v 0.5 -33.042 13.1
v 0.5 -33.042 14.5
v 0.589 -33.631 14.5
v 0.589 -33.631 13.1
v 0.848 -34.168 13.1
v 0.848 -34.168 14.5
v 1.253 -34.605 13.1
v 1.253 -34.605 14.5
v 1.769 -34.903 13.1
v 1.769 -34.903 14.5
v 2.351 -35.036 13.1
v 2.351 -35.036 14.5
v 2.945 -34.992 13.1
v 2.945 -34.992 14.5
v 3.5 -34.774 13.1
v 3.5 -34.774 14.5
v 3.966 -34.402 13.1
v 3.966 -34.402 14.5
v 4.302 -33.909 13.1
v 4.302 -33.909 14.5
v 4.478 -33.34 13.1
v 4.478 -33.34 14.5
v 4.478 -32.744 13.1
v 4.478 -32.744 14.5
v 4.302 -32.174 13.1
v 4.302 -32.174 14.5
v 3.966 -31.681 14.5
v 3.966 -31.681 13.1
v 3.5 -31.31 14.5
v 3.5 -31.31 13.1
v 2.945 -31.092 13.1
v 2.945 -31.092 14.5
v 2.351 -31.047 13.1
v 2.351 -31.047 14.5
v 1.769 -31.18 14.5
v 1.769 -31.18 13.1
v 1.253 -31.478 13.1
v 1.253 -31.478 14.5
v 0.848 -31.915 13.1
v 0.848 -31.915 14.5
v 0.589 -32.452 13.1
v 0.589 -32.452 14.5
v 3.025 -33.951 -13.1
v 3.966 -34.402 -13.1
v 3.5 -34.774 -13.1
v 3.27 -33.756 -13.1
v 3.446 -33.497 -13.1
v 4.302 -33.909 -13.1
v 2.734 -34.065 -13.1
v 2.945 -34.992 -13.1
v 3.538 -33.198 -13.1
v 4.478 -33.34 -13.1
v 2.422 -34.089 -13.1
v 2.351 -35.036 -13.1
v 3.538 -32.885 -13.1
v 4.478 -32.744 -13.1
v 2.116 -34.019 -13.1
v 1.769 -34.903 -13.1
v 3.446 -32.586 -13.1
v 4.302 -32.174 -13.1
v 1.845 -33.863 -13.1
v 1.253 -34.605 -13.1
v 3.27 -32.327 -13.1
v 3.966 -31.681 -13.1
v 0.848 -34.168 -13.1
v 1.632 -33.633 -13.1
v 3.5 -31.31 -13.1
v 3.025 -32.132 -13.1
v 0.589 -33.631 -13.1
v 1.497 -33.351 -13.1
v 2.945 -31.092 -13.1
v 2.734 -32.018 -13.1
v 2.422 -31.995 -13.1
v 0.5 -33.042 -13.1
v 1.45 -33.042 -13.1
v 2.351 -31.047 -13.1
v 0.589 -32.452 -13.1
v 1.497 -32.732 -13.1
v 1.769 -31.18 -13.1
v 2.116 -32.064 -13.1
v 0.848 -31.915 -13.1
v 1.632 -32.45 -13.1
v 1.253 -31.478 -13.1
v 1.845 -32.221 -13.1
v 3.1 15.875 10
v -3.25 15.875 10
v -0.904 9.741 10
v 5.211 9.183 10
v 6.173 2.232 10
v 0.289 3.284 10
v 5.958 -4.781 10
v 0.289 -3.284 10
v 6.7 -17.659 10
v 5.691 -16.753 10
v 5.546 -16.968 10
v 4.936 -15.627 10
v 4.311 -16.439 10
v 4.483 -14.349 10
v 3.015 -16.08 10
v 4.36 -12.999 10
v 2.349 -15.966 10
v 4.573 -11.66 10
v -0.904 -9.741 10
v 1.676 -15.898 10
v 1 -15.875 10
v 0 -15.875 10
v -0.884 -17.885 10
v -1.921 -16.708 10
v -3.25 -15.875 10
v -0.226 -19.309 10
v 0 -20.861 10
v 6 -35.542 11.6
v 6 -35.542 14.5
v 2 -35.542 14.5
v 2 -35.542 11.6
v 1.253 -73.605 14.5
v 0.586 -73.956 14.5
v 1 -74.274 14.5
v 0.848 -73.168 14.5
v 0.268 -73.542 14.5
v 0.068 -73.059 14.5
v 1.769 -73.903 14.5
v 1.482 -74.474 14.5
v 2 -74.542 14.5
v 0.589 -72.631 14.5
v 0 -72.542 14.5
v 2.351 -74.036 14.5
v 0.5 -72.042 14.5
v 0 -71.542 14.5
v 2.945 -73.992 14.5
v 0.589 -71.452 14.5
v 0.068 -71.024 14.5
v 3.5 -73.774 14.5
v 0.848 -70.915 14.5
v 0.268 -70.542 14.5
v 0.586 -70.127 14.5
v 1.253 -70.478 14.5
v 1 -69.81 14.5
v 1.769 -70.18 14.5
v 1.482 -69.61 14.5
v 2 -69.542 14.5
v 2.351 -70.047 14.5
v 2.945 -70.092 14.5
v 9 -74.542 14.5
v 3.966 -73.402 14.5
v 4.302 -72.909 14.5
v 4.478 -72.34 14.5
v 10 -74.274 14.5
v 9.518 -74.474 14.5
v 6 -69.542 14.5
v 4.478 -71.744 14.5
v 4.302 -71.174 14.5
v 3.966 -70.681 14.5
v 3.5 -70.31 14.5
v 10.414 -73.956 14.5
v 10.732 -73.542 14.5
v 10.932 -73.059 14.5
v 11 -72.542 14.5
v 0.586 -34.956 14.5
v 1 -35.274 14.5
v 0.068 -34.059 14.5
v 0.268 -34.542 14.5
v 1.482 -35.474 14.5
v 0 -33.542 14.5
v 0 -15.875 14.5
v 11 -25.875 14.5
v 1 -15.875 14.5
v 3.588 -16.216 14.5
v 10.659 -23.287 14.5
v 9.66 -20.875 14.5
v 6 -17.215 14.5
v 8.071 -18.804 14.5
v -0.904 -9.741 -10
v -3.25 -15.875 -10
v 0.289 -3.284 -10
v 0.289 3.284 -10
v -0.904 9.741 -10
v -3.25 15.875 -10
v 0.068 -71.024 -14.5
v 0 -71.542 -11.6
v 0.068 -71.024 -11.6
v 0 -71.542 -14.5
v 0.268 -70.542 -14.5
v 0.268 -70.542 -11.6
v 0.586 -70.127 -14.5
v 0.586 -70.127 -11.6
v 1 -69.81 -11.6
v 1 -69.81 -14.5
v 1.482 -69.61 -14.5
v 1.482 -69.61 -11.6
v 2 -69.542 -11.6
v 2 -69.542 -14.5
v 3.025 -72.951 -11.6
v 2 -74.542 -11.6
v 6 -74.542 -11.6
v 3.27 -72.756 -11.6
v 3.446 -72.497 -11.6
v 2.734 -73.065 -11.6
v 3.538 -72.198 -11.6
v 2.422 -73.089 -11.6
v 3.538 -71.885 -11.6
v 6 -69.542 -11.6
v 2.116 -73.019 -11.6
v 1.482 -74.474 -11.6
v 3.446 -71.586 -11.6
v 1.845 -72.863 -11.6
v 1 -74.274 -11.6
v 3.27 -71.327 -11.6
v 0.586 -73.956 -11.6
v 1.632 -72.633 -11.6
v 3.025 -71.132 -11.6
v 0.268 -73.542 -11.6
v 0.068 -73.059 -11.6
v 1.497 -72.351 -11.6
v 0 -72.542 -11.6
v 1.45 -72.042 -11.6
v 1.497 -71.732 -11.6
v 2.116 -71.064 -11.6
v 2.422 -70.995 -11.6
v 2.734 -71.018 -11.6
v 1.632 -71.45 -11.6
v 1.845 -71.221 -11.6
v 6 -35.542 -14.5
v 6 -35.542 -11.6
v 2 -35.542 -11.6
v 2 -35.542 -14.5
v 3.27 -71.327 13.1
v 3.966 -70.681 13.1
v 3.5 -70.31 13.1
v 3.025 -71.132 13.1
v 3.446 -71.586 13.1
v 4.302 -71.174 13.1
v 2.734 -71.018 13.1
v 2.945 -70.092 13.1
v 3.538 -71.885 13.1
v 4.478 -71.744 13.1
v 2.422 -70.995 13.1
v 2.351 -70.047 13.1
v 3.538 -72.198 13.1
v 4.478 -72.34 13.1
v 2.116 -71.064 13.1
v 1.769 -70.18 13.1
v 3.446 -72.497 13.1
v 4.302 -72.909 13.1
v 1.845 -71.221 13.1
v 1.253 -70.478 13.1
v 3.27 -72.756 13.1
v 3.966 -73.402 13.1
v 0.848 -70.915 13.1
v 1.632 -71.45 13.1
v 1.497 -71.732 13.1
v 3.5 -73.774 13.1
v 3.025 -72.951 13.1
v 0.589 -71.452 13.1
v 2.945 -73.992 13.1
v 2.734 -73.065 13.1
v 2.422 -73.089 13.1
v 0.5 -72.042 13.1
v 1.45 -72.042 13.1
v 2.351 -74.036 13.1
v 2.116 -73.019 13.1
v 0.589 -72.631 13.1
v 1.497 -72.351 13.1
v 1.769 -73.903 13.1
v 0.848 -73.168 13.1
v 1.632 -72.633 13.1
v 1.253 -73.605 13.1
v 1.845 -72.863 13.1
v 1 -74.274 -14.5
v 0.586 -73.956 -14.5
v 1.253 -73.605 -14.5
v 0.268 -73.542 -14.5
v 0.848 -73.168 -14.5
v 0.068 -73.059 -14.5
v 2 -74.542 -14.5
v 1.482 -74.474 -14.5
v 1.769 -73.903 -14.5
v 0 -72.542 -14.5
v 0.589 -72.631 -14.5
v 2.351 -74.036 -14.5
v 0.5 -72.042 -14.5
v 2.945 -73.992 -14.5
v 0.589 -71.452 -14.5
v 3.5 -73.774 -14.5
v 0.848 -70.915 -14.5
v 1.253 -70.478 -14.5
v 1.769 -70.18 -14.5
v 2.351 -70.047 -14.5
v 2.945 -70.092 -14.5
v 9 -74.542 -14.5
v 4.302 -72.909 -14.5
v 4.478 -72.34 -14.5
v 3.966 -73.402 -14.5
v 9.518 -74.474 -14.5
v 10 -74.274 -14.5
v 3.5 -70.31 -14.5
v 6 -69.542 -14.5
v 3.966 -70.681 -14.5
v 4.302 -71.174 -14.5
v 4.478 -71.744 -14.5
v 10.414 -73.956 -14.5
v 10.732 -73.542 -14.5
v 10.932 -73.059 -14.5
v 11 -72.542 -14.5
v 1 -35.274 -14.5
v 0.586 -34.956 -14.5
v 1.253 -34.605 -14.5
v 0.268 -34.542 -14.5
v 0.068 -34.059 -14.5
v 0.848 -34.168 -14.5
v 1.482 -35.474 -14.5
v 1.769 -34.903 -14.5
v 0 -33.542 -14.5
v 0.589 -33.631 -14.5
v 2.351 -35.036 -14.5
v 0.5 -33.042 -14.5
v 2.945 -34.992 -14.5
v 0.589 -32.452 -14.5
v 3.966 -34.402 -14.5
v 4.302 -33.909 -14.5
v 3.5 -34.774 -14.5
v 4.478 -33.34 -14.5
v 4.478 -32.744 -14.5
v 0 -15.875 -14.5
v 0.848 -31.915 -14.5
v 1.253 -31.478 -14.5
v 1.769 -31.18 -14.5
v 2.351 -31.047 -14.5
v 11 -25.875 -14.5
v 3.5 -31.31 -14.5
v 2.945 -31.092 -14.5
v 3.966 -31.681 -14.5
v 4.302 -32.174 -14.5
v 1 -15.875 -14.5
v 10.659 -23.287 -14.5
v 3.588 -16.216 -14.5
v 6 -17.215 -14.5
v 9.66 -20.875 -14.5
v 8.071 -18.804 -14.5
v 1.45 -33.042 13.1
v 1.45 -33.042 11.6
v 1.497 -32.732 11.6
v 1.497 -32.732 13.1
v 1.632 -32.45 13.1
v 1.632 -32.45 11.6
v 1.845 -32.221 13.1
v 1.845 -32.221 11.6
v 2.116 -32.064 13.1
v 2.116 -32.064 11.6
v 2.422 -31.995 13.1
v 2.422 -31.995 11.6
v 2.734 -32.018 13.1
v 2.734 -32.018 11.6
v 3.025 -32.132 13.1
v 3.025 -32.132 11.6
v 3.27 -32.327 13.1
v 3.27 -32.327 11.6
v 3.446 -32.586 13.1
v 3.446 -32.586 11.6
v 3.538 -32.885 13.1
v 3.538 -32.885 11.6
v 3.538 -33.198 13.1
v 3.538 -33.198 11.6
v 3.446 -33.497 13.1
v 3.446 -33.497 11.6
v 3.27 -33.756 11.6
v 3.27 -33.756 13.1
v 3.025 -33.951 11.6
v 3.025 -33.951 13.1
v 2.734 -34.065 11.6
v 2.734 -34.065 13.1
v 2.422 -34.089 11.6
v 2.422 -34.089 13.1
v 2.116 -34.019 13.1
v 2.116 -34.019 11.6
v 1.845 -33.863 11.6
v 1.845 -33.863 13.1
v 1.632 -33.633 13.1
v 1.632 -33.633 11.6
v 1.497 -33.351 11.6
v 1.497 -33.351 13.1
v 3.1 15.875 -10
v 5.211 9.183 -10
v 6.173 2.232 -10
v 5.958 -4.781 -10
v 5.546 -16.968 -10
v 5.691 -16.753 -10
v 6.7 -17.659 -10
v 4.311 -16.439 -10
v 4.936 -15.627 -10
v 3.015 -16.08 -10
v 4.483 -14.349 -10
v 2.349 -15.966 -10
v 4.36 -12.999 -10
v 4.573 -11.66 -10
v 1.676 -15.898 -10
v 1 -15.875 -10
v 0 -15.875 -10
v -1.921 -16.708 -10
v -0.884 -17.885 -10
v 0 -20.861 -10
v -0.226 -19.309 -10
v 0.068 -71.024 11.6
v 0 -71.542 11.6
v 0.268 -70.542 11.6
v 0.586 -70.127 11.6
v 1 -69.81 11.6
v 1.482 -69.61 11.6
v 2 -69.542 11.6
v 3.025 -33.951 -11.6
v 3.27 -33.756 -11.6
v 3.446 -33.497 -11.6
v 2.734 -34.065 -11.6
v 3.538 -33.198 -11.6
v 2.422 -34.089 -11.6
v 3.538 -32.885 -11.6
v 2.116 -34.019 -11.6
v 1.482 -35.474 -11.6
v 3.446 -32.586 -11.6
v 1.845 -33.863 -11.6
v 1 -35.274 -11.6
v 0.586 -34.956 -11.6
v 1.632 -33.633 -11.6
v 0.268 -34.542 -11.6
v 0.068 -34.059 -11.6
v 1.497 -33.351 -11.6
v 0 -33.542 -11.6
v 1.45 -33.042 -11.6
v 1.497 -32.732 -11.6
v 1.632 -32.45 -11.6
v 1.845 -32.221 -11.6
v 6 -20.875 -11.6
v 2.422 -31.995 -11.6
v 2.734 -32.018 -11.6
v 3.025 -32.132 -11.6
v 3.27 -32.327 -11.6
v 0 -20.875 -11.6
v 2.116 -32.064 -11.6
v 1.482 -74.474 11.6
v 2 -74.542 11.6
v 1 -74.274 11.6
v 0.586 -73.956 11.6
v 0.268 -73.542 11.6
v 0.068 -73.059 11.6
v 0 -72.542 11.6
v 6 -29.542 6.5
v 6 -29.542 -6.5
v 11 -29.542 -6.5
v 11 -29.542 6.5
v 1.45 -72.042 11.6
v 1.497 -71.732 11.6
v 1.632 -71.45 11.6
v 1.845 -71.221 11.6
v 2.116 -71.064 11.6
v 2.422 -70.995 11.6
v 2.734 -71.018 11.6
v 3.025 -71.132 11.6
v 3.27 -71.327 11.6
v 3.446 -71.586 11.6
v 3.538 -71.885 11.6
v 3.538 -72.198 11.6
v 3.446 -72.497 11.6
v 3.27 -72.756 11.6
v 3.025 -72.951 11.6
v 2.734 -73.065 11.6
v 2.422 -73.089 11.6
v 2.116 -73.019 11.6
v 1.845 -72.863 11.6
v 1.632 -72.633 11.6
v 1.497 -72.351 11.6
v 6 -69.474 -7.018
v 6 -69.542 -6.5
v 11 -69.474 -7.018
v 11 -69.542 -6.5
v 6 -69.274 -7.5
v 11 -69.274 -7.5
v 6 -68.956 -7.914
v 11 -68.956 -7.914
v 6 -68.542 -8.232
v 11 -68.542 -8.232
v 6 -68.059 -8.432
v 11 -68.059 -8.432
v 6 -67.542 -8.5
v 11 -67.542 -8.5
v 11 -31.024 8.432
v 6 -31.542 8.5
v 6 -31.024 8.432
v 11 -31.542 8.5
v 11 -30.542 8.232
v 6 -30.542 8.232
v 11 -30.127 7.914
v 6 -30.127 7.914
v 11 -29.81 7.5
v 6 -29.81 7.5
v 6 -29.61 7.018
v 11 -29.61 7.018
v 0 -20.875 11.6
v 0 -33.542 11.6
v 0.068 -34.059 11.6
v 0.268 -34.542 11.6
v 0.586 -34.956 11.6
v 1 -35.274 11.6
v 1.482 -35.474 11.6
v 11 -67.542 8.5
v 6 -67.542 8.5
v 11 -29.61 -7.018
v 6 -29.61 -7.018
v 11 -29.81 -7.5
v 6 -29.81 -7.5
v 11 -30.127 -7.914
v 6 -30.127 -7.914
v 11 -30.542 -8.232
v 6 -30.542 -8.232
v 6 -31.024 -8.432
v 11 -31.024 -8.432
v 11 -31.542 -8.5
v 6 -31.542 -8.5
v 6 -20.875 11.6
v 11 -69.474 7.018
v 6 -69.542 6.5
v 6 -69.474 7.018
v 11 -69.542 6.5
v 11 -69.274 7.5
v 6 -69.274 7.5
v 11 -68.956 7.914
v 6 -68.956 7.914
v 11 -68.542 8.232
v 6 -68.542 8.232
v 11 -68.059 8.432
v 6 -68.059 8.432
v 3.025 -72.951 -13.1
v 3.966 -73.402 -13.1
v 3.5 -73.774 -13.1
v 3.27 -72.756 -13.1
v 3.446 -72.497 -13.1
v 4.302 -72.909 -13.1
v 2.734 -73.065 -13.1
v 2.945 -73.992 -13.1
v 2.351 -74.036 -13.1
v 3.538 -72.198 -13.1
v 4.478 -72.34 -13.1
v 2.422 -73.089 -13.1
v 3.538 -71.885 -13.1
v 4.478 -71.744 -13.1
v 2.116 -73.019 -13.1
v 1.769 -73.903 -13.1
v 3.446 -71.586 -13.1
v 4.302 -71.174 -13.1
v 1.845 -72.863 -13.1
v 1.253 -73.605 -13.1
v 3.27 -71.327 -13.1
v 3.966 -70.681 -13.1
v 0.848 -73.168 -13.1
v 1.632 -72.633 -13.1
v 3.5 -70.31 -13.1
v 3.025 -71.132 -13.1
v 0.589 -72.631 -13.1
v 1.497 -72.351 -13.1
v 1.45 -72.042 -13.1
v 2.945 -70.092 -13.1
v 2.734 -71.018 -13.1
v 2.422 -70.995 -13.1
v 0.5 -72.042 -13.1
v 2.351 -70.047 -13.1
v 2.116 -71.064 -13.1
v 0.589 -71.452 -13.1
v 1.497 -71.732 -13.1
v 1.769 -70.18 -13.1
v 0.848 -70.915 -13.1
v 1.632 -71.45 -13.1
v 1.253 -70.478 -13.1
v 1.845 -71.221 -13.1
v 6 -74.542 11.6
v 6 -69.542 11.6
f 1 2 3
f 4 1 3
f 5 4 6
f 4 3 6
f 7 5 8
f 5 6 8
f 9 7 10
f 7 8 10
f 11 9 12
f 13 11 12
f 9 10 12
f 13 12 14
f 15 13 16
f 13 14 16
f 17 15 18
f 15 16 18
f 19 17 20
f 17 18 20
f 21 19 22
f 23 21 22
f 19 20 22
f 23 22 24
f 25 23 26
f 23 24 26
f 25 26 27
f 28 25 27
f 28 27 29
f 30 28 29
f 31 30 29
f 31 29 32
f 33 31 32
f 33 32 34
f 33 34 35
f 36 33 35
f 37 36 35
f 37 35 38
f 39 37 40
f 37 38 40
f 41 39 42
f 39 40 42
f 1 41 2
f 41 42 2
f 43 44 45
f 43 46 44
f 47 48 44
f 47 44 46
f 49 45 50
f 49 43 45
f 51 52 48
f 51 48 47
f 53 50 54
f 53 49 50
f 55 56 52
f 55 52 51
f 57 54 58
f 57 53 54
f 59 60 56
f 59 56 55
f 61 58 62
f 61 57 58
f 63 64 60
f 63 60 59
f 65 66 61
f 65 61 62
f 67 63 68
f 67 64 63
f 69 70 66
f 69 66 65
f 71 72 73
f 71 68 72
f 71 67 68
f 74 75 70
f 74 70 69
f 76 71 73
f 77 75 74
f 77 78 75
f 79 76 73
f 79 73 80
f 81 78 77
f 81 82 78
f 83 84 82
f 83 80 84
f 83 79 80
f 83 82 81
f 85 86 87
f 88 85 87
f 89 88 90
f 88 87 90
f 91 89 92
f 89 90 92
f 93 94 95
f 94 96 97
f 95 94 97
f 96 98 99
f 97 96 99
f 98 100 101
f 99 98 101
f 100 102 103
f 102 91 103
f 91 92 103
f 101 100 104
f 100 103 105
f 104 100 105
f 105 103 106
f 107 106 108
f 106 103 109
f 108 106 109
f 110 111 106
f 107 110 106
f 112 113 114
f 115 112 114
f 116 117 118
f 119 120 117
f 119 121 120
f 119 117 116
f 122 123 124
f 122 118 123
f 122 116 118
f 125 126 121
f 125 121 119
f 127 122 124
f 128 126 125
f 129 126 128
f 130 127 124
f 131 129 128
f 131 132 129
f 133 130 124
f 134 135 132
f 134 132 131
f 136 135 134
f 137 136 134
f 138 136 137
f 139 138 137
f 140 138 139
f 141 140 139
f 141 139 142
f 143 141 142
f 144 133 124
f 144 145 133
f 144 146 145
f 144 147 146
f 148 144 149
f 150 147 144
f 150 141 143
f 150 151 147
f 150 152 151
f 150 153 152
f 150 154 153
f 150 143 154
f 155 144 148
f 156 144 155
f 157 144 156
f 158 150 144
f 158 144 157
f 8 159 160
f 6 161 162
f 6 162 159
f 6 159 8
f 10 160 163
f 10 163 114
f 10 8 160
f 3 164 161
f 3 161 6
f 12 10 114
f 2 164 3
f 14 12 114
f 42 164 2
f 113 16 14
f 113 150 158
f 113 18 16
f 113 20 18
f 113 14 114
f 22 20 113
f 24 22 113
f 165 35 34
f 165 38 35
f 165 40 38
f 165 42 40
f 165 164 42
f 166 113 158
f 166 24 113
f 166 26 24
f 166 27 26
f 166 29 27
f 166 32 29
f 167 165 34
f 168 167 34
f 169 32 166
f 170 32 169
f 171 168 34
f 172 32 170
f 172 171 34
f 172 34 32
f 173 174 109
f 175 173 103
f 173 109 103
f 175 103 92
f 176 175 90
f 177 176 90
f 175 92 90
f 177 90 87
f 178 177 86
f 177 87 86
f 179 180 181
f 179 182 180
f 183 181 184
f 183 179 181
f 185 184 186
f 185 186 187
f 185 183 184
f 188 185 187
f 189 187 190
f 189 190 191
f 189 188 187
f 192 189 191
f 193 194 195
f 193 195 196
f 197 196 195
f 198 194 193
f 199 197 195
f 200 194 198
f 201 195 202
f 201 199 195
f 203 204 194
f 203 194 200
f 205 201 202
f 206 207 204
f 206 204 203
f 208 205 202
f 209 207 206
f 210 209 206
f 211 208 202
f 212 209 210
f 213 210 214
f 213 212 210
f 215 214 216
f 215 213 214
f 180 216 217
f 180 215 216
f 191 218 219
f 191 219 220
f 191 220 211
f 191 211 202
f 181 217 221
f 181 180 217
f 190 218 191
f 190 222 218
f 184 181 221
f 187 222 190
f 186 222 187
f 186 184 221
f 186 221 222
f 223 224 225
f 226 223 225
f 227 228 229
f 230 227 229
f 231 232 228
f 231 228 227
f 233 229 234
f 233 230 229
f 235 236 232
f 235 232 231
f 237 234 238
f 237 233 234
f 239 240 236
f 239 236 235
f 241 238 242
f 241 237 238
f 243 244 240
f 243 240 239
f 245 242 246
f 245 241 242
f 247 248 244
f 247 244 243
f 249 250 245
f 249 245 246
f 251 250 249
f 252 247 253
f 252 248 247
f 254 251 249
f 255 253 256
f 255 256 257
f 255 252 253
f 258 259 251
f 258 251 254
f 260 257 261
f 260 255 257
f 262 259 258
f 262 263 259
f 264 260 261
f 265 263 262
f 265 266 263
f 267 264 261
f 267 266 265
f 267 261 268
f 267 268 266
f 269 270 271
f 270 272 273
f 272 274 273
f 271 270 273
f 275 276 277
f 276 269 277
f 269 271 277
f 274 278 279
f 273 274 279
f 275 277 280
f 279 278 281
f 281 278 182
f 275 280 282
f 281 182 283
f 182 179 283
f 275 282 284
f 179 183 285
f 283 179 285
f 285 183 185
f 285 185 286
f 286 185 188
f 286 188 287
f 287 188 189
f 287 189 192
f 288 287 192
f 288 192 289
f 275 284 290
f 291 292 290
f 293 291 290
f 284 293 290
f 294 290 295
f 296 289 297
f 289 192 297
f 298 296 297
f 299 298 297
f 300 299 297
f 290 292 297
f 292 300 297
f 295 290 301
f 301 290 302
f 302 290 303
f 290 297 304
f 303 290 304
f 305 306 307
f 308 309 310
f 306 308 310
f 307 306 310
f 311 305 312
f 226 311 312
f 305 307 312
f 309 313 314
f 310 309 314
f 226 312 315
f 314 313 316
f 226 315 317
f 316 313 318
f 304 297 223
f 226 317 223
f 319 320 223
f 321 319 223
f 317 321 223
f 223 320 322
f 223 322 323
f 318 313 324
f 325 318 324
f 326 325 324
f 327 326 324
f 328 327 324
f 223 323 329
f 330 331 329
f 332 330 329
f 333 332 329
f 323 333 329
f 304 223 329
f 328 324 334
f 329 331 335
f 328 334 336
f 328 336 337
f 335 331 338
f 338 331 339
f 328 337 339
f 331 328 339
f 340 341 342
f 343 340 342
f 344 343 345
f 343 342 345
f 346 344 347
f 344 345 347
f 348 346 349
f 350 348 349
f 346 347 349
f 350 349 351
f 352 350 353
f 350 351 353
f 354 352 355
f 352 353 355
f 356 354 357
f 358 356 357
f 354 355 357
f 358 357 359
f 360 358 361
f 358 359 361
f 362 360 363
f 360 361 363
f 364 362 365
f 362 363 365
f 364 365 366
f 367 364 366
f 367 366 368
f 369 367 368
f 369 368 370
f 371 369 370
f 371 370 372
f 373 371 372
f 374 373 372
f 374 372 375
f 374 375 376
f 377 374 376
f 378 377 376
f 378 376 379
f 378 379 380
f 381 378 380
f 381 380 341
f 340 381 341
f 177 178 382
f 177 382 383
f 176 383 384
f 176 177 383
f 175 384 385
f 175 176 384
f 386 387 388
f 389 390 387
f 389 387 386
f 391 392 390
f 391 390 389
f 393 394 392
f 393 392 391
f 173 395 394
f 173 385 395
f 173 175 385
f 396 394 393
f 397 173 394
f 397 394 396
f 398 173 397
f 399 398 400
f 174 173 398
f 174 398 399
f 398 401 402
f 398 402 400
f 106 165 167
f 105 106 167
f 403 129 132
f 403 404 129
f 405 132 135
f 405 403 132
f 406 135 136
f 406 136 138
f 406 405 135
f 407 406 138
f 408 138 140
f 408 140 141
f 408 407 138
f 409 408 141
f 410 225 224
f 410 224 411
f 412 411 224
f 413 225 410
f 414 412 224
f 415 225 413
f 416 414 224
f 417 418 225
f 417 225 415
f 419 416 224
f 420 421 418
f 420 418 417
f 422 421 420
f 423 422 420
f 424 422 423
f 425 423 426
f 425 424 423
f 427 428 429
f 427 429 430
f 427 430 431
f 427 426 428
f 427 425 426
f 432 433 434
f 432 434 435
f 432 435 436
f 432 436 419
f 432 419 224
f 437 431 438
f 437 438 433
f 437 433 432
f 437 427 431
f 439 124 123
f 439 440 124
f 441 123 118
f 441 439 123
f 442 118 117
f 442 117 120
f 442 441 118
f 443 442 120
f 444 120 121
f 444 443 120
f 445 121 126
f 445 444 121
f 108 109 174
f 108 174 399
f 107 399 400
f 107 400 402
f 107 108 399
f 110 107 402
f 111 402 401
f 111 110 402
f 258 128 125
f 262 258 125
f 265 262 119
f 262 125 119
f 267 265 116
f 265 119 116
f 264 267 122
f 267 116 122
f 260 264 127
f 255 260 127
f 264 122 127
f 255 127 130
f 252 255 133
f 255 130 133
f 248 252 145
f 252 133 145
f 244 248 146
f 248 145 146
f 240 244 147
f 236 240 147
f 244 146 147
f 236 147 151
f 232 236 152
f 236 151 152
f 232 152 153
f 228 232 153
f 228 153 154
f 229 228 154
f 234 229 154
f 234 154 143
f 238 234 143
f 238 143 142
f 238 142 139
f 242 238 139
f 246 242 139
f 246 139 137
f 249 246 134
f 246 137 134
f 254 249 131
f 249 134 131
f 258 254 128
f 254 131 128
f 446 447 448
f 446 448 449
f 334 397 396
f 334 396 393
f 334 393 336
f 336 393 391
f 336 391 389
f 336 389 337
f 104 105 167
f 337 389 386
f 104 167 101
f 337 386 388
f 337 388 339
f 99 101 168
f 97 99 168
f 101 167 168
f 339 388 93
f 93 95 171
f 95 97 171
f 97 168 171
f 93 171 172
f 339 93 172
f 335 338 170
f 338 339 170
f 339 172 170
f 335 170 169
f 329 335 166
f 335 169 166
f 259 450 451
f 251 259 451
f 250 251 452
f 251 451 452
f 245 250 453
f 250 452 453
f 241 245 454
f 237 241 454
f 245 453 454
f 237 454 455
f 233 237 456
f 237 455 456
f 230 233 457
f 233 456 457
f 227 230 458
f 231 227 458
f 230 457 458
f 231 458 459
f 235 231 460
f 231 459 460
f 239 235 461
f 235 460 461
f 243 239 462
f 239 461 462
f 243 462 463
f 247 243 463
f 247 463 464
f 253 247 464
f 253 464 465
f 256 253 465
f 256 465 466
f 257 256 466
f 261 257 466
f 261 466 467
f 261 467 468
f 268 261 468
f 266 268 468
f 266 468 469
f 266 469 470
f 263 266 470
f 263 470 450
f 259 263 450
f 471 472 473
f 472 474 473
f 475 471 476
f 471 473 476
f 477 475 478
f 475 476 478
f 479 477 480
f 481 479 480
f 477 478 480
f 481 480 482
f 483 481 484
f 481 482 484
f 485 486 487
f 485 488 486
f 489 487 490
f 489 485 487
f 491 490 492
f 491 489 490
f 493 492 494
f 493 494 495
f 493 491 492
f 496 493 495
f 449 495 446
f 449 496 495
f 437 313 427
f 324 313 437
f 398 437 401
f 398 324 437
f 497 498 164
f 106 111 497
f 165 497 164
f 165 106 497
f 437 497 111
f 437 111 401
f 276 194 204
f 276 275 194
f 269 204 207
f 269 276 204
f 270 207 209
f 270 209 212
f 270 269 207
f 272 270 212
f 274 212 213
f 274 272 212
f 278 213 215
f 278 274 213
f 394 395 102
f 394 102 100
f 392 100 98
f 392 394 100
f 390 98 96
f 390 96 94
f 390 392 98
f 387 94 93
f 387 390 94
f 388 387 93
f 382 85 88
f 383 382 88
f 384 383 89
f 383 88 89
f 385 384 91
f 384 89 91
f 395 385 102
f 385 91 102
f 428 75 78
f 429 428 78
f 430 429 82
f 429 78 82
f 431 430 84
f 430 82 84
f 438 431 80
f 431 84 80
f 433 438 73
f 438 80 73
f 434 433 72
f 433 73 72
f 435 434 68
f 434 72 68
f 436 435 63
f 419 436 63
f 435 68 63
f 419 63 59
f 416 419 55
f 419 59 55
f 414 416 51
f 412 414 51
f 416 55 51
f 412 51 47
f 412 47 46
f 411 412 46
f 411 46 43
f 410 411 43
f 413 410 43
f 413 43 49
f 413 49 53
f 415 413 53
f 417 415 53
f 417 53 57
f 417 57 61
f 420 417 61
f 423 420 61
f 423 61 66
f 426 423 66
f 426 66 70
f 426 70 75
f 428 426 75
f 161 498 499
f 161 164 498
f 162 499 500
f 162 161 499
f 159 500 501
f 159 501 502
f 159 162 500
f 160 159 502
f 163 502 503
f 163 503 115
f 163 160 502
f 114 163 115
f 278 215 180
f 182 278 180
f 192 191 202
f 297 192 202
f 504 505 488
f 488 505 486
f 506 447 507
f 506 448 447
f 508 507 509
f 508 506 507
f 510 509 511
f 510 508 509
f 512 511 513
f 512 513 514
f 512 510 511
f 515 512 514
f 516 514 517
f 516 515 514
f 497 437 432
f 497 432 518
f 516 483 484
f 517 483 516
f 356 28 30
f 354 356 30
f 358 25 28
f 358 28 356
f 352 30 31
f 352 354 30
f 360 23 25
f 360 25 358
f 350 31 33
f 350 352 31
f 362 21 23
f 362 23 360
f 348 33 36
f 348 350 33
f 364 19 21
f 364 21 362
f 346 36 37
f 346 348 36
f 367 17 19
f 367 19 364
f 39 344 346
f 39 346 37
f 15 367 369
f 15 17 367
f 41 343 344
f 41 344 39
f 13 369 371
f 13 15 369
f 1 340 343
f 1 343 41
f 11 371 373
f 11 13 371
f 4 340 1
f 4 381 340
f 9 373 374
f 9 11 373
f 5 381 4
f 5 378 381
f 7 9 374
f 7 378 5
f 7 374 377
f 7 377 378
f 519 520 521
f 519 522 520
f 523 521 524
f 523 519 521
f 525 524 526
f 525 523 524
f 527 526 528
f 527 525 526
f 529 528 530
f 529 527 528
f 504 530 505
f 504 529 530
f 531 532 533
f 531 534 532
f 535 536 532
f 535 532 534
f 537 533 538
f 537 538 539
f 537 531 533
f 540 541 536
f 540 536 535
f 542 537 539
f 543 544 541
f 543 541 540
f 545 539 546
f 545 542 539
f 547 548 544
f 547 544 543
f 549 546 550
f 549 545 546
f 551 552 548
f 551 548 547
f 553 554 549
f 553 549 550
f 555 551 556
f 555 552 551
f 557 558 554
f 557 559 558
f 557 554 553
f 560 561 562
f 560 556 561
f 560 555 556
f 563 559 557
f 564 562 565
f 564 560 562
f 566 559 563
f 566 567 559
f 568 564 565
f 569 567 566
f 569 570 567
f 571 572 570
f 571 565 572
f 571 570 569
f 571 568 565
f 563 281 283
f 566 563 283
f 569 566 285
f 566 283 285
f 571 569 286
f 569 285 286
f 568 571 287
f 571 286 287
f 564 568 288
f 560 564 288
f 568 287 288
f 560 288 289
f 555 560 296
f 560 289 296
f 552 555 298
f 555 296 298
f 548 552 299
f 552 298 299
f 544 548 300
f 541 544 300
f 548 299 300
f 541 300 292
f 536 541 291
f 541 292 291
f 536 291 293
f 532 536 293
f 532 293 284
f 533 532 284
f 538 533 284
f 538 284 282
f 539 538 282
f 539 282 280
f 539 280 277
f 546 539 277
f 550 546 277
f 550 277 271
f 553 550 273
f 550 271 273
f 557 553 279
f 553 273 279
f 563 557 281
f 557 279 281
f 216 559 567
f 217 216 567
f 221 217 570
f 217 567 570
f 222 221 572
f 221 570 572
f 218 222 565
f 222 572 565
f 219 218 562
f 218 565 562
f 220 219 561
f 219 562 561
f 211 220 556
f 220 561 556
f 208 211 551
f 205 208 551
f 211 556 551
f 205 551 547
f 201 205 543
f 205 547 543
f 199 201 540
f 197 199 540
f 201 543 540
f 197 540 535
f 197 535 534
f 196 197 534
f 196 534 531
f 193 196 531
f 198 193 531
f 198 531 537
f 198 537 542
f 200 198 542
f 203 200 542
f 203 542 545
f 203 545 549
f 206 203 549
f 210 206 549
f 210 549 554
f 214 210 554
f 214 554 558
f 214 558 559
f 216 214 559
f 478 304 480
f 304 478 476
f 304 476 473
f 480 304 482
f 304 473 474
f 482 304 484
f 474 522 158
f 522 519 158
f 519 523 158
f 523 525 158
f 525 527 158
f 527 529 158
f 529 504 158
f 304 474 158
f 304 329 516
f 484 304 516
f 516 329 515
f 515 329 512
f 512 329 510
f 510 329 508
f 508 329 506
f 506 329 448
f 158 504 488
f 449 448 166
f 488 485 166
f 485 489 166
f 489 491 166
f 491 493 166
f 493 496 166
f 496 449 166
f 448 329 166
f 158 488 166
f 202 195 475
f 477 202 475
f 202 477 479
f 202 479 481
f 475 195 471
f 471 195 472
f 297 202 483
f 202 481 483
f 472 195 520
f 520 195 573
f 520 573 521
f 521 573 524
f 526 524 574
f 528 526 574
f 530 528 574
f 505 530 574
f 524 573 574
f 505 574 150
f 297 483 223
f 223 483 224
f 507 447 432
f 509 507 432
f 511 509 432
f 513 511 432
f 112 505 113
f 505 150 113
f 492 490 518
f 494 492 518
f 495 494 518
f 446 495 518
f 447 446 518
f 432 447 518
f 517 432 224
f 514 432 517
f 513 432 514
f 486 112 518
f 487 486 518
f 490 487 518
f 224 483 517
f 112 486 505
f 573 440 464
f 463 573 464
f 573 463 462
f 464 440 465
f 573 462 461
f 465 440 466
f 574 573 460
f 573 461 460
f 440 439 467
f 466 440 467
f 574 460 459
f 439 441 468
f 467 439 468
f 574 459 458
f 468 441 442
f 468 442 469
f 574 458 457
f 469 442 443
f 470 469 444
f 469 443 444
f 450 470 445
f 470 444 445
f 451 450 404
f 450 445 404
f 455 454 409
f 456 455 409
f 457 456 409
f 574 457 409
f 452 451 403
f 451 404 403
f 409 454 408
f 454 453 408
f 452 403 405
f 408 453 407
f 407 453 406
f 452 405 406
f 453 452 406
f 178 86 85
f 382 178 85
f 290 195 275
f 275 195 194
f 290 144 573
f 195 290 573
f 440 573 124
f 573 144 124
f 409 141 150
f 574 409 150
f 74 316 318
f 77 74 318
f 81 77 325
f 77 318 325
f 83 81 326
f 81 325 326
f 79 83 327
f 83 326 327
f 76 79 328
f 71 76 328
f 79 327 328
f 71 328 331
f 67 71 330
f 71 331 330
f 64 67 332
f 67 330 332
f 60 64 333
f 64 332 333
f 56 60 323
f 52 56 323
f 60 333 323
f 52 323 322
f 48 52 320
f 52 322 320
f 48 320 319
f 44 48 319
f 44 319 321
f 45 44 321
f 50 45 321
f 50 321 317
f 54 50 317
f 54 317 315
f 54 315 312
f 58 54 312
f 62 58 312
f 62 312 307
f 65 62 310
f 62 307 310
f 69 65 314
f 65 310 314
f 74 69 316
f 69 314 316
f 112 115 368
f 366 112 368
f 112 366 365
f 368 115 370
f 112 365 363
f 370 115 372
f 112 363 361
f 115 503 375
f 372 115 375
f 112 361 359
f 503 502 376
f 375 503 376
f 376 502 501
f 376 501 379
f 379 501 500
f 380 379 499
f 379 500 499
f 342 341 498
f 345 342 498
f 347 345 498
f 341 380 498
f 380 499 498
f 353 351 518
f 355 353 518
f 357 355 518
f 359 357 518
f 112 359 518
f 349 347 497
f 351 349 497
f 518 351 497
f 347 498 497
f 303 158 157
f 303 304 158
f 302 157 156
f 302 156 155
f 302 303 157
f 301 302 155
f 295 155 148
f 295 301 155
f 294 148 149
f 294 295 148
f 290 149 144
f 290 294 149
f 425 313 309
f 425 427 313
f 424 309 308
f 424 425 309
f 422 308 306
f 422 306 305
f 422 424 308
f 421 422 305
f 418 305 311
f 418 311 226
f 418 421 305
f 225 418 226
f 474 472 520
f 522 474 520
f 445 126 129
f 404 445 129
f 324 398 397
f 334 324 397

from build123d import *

# Parameters (mm, degrees)
BOSS_EXTRUDE5_DEPTH = 10
BOSS_EXTRUDE6_DEPTH = 14.5
BOSS_EXTRUDE7_REACH = 63.425
SKETCH28_W          = 11
SKETCH28_H          = 29
SKETCH37_W          = 23.2
SKETCH37_H          = 14.666666667
CUT_EXTRUDE10_DEPTH = 6
SKETCH38_W          = 23.2
SKETCH38_H          = 5
CUT_EXTRUDE11_DEPTH = 6
SKETCH39_R          = 1.05
CUT_EXTRUDE12_DEPTH = 81.736980805
SKETCH40_R          = 2
CUT_EXTRUDE13_DEPTH = 1.4
SKETCH41_R          = 2
CUT_EXTRUDE14_DEPTH = 1.4
SKETCH42_W          = 17
SKETCH42_H          = 40
CUT_EXTRUDE15_DEPTH = 77.175521458
FILLET2_R           = 2
CUT_EXTRUDE16_DEPTH = 80.232001549
BOSS_EXTRUDE8_DEPTH = 10
FILLET3_R           = 10
FILLET4_R           = 5.45


with BuildPart() as part:
    # Sketch25 → Boss-Extrude5 (new, symmetric)
    with BuildSketch(Plane.XY):
        with BuildLine():
            Line((0, 15.875), (6.35, 15.875))
            ThreePointArc((6.35, 15.875), (9.840958299, 0), (6.35, -15.875))
            Line((6.35, -15.875), (0, -15.875))
            ThreePointArc((0, -15.875), (4.187196601, 0), (0, 15.875))
        make_face()
    extrude(amount=BOSS_EXTRUDE5_DEPTH, both=True)


with BuildPart() as body_2:
    # Sketch27 → Boss-Extrude6 (new, symmetric)
    with BuildSketch(Plane.XY):
        Polygon((0, -30.541666667), (11, -30.541666667), (11, -74.541666667), (0, -74.541666667), (0, -69.541666667), (6, -69.541666667), (6, -35.541666667), (0, -35.541666667), align=None)
    extrude(amount=BOSS_EXTRUDE6_DEPTH, both=True)

    # Sketch28 → Boss-Extrude7 (add, up to next)
    with BuildSketch(Plane.XZ.offset(15.875), mode=Mode.PRIVATE) as boss_extrude7_sk1:
        with Locations((5.5, 0)):
            Rectangle(SKETCH28_W, SKETCH28_H)
    boss_extrude7_tool1 = extrude(boss_extrude7_sk1.sketch, amount=BOSS_EXTRUDE7_REACH, mode=Mode.PRIVATE) - body_2.part

    add(part.part)  # Boss-Extrude7 merges part
    add(boss_extrude7_tool1.solids().sort_by_distance((5.5, -15.875, 0))[0])

    # Sketch37 → Cut-Extrude10 (cut)
    with BuildSketch(Plane.ZY):
        with Locations((0, -28.208333334)):
            Rectangle(SKETCH37_W, SKETCH37_H)
    extrude(amount=-CUT_EXTRUDE10_DEPTH, mode=Mode.SUBTRACT)

    # Sketch38 → Cut-Extrude11 (cut)
    with BuildSketch(Plane.ZY):
        with Locations((0, -72.041666667)):
            Rectangle(SKETCH38_W, SKETCH38_H)
    extrude(amount=-CUT_EXTRUDE11_DEPTH, mode=Mode.SUBTRACT)

    # Sketch39 → Cut-Extrude12 (cut, through all)
    with BuildSketch(Plane(origin=(0, 0, -14.5), x_dir=(-1, 0, 0), z_dir=(0, 0, -1))):
        with Locations((-2.5, -33.041666667)):
            Circle(SKETCH39_R)
        with Locations((-2.5, -72.041666667)):
            Circle(SKETCH39_R)
    extrude(amount=-CUT_EXTRUDE12_DEPTH, mode=Mode.SUBTRACT)

    # Sketch40 → Cut-Extrude13 (cut)
    with BuildSketch(Plane(origin=(0, 0, -14.5), x_dir=(-1, 0, 0), z_dir=(0, 0, -1))):
        with Locations((-2.5, -33.041666667)):
            Circle(SKETCH40_R)
        with Locations((-2.5, -72.041666667)):
            Circle(SKETCH40_R)
    extrude(amount=-CUT_EXTRUDE13_DEPTH, mode=Mode.SUBTRACT)

    # Sketch41 → Cut-Extrude14 (cut)
    with BuildSketch(Plane.XY.offset(14.5)):
        with Locations(Location((2.5, -33.041666667, 0), (0, 0, 180))):
            Circle(SKETCH41_R)
        with Locations(Location((2.5, -72.041666667, 0), (0, 0, 180))):
            Circle(SKETCH41_R)
    extrude(amount=-CUT_EXTRUDE14_DEPTH, mode=Mode.SUBTRACT)

    # Sketch42 → Cut-Extrude15 (cut, through all)
    with BuildSketch(Plane.ZY.offset(-6)):
        with Locations((0, -49.541666667)):
            Rectangle(SKETCH42_W, SKETCH42_H)
    extrude(amount=-CUT_EXTRUDE15_DEPTH, mode=Mode.SUBTRACT)

    # Fillet2
    fillet2_edges = [body_2.edges().sort_by_distance(p)[0] for p in [
        (8.5, -69.541666667, -8.5),
        (8.5, -29.541666667, -8.5),
        (8.5, -29.541666667, 8.5),
        (8.5, -69.541666667, 8.5),
        (0, -35.541666667, 13.05),
        (0, -69.541666667, 13.05),
        (0, -74.541666667, 13.05),
        (11, -74.541666667, 0),
        (0, -35.541666667, -13.05),
        (0, -74.541666667, -13.05),
        (0, -69.541666667, -13.05),
    ]]
    fillet(fillet2_edges, radius=FILLET2_R)

    # Sketch44 → Cut-Extrude16 (cut, through all)
    with BuildSketch(Plane.XY.offset(10)):
        with BuildLine():
            Line((6.35, -15.875), (0, -15.875))
            ThreePointArc((0, -15.875), (4.187196601, 0), (0, 15.875))
            Line((0, 15.875), (6.35, 15.875))
            ThreePointArc((6.35, 15.875), (9.840958299, 0), (6.35, -15.875))
        make_face()
    extrude(amount=-CUT_EXTRUDE16_DEPTH, mode=Mode.SUBTRACT)

    # Sketch43 → Boss-Extrude8 (add, symmetric)
    with BuildSketch(Plane.XY):
        with BuildLine():
            Line((-3.25, 15.875), (3.1, 15.875))
            ThreePointArc((3.1, 15.875), (6.232422098, 0), (3.1, -15.875))
            Line((3.1, -15.875), (-3.25, -15.875))
            ThreePointArc((-3.25, -15.875), (0.439252949, 0), (-3.25, 15.875))
        make_face()
    extrude(amount=BOSS_EXTRUDE8_DEPTH, both=True)

    # Fillet3
    # the kernel refuses this fillet: 10 mm, written as the material it takes off along each edge
    with BuildSketch(Plane(origin=(11, -15.875, 39.5), x_dir=(-1, 0, 0), z_dir=(0, 0, -1))) as fillet3_piece_1_section:
        with BuildLine():
            CenterArc((FILLET3_R, -FILLET3_R), FILLET3_R, 90, 90)
            Line((0, -FILLET3_R), (0, 0))
            Line((0, 0), (FILLET3_R, 0))
        make_face()
    fillet3_piece_1 = extrude(amount=79, mode=Mode.PRIVATE)
    fillet3_piece_1 = split(fillet3_piece_1, bisect_by=Plane(origin=(2.190951885, -15.815672455, 10), z_dir=(0, 0, 1)), keep=Keep.TOP, mode=Mode.PRIVATE)
    fillet3_piece_1 = fillet3_piece_1 & Plane(origin=(-35.560747051, 0, 24.75), x_dir=(0.925049424055658, 0.3798467625955178, 0), z_dir=(0, 0, 1)) * Cylinder(41.793169149, 198, mode=Mode.PRIVATE)
    add(fillet3_piece_1, mode=Mode.SUBTRACT)
    with BuildSketch(Plane(origin=(11, -15.875, 39.5), x_dir=(-1, 0, 0), z_dir=(0, 0, -1))) as fillet3_piece_2_section:
        with BuildLine():
            CenterArc((FILLET3_R, -FILLET3_R), FILLET3_R, 90, 90)
            Line((0, -FILLET3_R), (0, 0))
            Line((0, 0), (FILLET3_R, 0))
        make_face()
    fillet3_piece_2 = extrude(amount=79, mode=Mode.PRIVATE)
    fillet3_piece_2 = split(fillet3_piece_2, bisect_by=Plane(origin=(8.886802667, -18.192463431, 10), z_dir=(0, 0, 1)), keep=Keep.TOP, mode=Mode.PRIVATE)
    fillet3_piece_2 = fillet3_piece_2 - Plane(origin=(-35.560747051, 0, 24.75), x_dir=(0.925049424055658, 0.3798467625955178, 0), z_dir=(0, 0, 1)) * Cylinder(41.793169149, 198, mode=Mode.PRIVATE)
    add(fillet3_piece_2, mode=Mode.SUBTRACT)
    with BuildSketch(Plane(origin=(11, -15.875, 39.5), x_dir=(-1, 0, 0), z_dir=(0, 0, -1))) as fillet3_piece_3_section:
        with BuildLine():
            CenterArc((FILLET3_R, -FILLET3_R), FILLET3_R, 90, 90)
            Line((0, -FILLET3_R), (0, 0))
            Line((0, 0), (FILLET3_R, 0))
        make_face()
    fillet3_piece_3 = extrude(amount=79, mode=Mode.PRIVATE)
    fillet3_piece_3 = split(fillet3_piece_3, bisect_by=Plane(origin=(8.886802667, -18.192463431, 10), z_dir=(0, 0, -1)), keep=Keep.TOP, mode=Mode.PRIVATE)
    fillet3_piece_3 = fillet3_piece_3 - Plane(origin=(-35.560747051, 0, 0), x_dir=(0.925049424055658, 0.3798467625955178, 0), z_dir=(0, 0, 1)) * Cylinder(41.793169149, 198, mode=Mode.PRIVATE)
    fillet3_piece_3 = split(fillet3_piece_3, bisect_by=Plane(origin=(8.886802667, -18.192463431, -10), z_dir=(0, 0, 1)), keep=Keep.TOP, mode=Mode.PRIVATE)
    add(fillet3_piece_3, mode=Mode.SUBTRACT)
    with BuildSketch(Plane(origin=(11, -15.875, 39.5), x_dir=(-1, 0, 0), z_dir=(0, 0, -1))) as fillet3_piece_4_section:
        with BuildLine():
            CenterArc((FILLET3_R, -FILLET3_R), FILLET3_R, 90, 90)
            Line((0, -FILLET3_R), (0, 0))
            Line((0, 0), (FILLET3_R, 0))
        make_face()
    fillet3_piece_4 = extrude(amount=79, mode=Mode.PRIVATE)
    fillet3_piece_4 = fillet3_piece_4 & Plane(origin=(-35.560747051, 0, -24.75), x_dir=(0.925049424055658, 0.3798467625955178, 0), z_dir=(0, 0, 1)) * Cylinder(41.793169149, 198, mode=Mode.PRIVATE)
    fillet3_piece_4 = split(fillet3_piece_4, bisect_by=Plane(origin=(2.190951885, -15.815672455, -10), z_dir=(0, 0, -1)), keep=Keep.TOP, mode=Mode.PRIVATE)
    add(fillet3_piece_4, mode=Mode.SUBTRACT)
    with BuildSketch(Plane(origin=(11, -15.875, 39.5), x_dir=(-1, 0, 0), z_dir=(0, 0, -1))) as fillet3_piece_5_section:
        with BuildLine():
            CenterArc((FILLET3_R, -FILLET3_R), FILLET3_R, 90, 90)
            Line((0, -FILLET3_R), (0, 0))
            Line((0, 0), (FILLET3_R, 0))
        make_face()
    fillet3_piece_5 = extrude(amount=79, mode=Mode.PRIVATE)
    fillet3_piece_5 = fillet3_piece_5 - Plane(origin=(-35.560747051, 0, -24.75), x_dir=(0.925049424055658, 0.3798467625955178, 0), z_dir=(0, 0, 1)) * Cylinder(41.793169149, 198, mode=Mode.PRIVATE)
    fillet3_piece_5 = split(fillet3_piece_5, bisect_by=Plane(origin=(8.886802667, -18.192463431, -10), z_dir=(0, 0, -1)), keep=Keep.TOP, mode=Mode.PRIVATE)
    add(fillet3_piece_5, mode=Mode.SUBTRACT)

    # Fillet4
    # the kernel refuses this fillet: 5.45 mm, written as the material it adds along each edge
    with BuildSketch(Plane(origin=(0, -15.875, 10), x_dir=(-1, 0, 0), z_dir=(0, 0, -1))) as fillet4_piece_1:
        with BuildLine():
            CenterArc((5.45, -4.986231042), FILLET4_R, 113.807792078, 66.192207922)
            Line((0, -4.986231042), (0, 0))
            Line((0, 0), (3.25, 0))
        make_face()
    extrude(amount=20)
    with BuildSketch(Plane(origin=(3.015126937, -16.080140969, -10), x_dir=(0.33239794280209367, 0.9431392302417156, 0), z_dir=(0, 0, 1))) as fillet4_piece_2:
        with BuildLine():
            CenterArc((4.992113304, -5.441426809), FILLET4_R, 93.214160673, 71.449916977)
            ThreePointArc((-0.263821953, -4.000023125), (0.07058047, -2.013366907), (0, 0))
            ThreePointArc((0, 0), (2.343270621, -0.065743272), (4.686541241, 0))
        make_face()
    extrude(amount=20)


solid = body_2.part
